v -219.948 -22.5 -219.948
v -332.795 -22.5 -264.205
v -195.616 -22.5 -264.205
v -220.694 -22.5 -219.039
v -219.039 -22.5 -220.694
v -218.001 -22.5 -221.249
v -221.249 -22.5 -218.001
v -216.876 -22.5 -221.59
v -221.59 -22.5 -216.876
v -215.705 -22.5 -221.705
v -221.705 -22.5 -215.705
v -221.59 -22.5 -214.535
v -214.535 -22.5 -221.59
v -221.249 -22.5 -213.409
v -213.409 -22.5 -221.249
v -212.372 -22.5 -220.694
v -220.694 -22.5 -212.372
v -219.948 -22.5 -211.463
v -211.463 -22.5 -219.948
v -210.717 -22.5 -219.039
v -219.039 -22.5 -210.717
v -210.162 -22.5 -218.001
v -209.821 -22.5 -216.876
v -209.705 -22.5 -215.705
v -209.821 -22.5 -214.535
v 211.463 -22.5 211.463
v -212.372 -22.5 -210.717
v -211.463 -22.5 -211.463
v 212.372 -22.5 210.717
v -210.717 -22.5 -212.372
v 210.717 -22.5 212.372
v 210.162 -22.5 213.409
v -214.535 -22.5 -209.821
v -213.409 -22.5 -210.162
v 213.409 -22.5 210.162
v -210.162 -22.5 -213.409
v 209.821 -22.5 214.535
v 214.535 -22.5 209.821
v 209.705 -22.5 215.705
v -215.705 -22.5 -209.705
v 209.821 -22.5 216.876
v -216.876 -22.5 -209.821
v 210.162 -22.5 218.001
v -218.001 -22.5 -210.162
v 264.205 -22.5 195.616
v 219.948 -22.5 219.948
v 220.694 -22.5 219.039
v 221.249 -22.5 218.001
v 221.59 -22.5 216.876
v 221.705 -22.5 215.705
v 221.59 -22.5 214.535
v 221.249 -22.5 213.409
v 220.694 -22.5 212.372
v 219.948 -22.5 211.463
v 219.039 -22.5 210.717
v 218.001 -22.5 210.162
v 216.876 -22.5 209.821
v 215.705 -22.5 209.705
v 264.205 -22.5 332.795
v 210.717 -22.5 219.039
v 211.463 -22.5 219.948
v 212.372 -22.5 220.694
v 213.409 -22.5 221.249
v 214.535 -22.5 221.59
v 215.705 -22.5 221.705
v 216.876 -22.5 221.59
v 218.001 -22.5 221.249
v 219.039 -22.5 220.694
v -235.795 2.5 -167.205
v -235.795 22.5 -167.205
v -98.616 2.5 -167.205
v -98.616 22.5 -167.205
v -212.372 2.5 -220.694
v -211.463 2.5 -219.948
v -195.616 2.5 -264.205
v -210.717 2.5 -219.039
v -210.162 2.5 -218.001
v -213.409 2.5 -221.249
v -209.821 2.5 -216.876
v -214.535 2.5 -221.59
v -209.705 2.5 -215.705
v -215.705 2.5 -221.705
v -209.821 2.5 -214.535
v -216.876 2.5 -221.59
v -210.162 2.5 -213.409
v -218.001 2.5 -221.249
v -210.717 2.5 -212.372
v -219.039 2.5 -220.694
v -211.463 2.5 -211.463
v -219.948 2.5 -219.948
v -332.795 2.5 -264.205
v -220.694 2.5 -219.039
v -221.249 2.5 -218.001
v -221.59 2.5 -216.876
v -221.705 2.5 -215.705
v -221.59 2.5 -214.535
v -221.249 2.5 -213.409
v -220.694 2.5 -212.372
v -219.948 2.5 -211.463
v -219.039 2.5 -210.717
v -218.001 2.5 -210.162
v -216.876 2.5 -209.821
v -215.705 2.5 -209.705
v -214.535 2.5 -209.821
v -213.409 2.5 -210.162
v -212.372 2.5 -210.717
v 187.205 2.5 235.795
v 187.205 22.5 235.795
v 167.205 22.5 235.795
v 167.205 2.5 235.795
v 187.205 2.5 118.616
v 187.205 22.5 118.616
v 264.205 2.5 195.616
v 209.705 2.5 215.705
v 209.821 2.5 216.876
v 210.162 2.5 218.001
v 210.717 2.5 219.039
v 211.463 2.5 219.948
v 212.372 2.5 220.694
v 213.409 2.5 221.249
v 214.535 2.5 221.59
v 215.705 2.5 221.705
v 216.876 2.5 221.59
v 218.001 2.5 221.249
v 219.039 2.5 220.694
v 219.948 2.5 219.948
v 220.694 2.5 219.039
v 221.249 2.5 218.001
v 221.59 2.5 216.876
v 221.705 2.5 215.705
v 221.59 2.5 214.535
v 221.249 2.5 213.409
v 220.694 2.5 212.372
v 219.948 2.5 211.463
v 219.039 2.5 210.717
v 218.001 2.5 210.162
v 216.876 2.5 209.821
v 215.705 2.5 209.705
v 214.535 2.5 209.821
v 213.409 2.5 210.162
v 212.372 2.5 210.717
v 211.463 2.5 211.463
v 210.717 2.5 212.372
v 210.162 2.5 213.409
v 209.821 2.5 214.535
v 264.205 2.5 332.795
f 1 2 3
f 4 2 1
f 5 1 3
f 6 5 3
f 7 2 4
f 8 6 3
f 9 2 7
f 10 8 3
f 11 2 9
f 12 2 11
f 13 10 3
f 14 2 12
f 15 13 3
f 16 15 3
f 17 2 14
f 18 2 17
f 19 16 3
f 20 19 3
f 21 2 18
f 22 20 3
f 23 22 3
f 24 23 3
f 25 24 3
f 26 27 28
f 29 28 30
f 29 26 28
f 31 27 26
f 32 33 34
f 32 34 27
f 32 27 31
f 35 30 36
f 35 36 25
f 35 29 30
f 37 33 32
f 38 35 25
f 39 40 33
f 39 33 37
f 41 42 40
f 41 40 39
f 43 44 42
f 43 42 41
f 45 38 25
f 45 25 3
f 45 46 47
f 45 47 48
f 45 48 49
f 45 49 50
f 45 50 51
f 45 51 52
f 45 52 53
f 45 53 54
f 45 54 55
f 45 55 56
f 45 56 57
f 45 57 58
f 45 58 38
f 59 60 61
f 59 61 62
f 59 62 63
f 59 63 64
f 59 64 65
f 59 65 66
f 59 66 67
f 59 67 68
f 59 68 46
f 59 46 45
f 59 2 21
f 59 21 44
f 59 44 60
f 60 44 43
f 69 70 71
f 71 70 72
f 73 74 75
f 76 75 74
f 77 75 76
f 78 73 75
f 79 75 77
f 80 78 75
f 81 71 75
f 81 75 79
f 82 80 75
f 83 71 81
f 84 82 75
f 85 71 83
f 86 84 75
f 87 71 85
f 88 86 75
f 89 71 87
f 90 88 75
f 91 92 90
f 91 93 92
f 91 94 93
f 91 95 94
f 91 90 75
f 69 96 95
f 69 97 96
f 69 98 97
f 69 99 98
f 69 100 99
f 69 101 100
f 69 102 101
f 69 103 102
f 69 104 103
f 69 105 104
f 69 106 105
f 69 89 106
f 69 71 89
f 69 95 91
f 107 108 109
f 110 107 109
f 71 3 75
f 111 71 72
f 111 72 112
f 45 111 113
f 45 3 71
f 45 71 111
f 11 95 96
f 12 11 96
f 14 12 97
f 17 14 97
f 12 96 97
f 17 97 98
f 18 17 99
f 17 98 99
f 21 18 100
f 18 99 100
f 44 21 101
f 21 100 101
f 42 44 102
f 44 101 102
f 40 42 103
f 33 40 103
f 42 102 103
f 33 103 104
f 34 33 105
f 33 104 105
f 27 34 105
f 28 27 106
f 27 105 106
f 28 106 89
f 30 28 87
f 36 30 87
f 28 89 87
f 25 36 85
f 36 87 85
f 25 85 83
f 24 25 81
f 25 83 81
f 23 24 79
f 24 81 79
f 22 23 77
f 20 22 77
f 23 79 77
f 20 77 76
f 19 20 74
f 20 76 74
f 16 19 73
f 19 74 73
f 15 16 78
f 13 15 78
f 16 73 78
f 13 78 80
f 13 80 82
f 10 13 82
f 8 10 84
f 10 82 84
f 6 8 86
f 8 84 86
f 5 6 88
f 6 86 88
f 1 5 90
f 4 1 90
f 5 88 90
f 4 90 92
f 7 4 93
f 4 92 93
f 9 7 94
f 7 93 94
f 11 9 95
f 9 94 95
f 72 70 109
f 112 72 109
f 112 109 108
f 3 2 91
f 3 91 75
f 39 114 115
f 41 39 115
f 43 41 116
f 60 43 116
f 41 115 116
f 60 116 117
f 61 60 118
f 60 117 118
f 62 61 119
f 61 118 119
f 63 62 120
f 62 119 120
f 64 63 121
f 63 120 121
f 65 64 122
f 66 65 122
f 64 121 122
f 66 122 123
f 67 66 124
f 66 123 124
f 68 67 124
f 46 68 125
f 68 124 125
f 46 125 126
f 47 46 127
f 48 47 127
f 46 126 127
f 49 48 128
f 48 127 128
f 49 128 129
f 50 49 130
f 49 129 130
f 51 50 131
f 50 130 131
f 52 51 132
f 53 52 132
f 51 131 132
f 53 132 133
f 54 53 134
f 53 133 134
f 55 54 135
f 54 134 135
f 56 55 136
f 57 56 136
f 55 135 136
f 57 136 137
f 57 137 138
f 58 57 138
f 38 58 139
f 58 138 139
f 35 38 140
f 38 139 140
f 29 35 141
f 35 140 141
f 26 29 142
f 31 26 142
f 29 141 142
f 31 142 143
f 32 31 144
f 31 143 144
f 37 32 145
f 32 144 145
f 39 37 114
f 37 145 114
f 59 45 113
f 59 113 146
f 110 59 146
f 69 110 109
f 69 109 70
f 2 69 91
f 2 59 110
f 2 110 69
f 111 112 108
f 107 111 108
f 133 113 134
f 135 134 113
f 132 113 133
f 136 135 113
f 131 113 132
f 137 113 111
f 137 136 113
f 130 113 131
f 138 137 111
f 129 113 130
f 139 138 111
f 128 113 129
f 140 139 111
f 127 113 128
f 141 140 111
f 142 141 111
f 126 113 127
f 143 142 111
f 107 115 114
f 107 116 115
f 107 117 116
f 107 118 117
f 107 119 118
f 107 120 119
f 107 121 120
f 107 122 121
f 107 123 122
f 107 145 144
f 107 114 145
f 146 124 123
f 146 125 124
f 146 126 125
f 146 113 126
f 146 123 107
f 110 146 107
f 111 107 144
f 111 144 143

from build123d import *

# Parameters (mm, degrees)
F1_DEPTH = 22.5
F3_DEPTH = 20
F5_DEPTH = 20
F6_R     = 6
F7_DEPTH = 25
F8_R     = 6
F9_DEPTH = 25


with BuildPart() as f1:
    # F0 (on Front) → F1 (new body, symmetric)
    with BuildSketch(Plane.XZ):
        Polygon((264.205321, 195.615963), (264.205321, 332.794679), (-332.794679, -264.205321), (-195.615963, -264.205321), align=None)
    extrude(amount=F1_DEPTH, both=True)

    # F2 (on face) → F3 (cut)
    with BuildSketch(Plane(origin=(0, 22.5, 0), x_dir=(-1, 0, 0), z_dir=(0, 1, 0))):
        Polygon((-187.205321, 235.794679), (-167.205321, 235.794679), (-264.205321, 332.794679), (-264.205321, 195.615963), (-187.205321, 118.615963), align=None)
    extrude(amount=-F3_DEPTH, mode=Mode.SUBTRACT)

    # F4 (on face) → F5 (cut)
    with BuildSketch(Plane(origin=(0, 22.5, 0), x_dir=(-1, 0, 0), z_dir=(0, 1, 0))):
        Polygon((332.794679, -264.205321), (235.794679, -167.205321), (98.615963, -167.205321), (195.615963, -264.205321), align=None)
    extrude(amount=-F5_DEPTH, mode=Mode.SUBTRACT)

    # F6 (on face) → F7 (cut, through all)
    with BuildSketch(Plane(origin=(0, 2.5, 0), x_dir=(-1, 0, 0), z_dir=(0, 1, 0))):
        with Locations((-215.705321, 215.705321)):
            Circle(F6_R)
    extrude(amount=-F7_DEPTH, mode=Mode.SUBTRACT)

    # F8 (on face) → F9 (cut, through all)
    with BuildSketch(Plane(origin=(0, 2.5, 0), x_dir=(-1, 0, 0), z_dir=(0, 1, 0))):
        with Locations((215.705321, -215.705321)):
            Circle(F8_R)
    extrude(amount=-F9_DEPTH, mode=Mode.SUBTRACT)


solid = f1.part
